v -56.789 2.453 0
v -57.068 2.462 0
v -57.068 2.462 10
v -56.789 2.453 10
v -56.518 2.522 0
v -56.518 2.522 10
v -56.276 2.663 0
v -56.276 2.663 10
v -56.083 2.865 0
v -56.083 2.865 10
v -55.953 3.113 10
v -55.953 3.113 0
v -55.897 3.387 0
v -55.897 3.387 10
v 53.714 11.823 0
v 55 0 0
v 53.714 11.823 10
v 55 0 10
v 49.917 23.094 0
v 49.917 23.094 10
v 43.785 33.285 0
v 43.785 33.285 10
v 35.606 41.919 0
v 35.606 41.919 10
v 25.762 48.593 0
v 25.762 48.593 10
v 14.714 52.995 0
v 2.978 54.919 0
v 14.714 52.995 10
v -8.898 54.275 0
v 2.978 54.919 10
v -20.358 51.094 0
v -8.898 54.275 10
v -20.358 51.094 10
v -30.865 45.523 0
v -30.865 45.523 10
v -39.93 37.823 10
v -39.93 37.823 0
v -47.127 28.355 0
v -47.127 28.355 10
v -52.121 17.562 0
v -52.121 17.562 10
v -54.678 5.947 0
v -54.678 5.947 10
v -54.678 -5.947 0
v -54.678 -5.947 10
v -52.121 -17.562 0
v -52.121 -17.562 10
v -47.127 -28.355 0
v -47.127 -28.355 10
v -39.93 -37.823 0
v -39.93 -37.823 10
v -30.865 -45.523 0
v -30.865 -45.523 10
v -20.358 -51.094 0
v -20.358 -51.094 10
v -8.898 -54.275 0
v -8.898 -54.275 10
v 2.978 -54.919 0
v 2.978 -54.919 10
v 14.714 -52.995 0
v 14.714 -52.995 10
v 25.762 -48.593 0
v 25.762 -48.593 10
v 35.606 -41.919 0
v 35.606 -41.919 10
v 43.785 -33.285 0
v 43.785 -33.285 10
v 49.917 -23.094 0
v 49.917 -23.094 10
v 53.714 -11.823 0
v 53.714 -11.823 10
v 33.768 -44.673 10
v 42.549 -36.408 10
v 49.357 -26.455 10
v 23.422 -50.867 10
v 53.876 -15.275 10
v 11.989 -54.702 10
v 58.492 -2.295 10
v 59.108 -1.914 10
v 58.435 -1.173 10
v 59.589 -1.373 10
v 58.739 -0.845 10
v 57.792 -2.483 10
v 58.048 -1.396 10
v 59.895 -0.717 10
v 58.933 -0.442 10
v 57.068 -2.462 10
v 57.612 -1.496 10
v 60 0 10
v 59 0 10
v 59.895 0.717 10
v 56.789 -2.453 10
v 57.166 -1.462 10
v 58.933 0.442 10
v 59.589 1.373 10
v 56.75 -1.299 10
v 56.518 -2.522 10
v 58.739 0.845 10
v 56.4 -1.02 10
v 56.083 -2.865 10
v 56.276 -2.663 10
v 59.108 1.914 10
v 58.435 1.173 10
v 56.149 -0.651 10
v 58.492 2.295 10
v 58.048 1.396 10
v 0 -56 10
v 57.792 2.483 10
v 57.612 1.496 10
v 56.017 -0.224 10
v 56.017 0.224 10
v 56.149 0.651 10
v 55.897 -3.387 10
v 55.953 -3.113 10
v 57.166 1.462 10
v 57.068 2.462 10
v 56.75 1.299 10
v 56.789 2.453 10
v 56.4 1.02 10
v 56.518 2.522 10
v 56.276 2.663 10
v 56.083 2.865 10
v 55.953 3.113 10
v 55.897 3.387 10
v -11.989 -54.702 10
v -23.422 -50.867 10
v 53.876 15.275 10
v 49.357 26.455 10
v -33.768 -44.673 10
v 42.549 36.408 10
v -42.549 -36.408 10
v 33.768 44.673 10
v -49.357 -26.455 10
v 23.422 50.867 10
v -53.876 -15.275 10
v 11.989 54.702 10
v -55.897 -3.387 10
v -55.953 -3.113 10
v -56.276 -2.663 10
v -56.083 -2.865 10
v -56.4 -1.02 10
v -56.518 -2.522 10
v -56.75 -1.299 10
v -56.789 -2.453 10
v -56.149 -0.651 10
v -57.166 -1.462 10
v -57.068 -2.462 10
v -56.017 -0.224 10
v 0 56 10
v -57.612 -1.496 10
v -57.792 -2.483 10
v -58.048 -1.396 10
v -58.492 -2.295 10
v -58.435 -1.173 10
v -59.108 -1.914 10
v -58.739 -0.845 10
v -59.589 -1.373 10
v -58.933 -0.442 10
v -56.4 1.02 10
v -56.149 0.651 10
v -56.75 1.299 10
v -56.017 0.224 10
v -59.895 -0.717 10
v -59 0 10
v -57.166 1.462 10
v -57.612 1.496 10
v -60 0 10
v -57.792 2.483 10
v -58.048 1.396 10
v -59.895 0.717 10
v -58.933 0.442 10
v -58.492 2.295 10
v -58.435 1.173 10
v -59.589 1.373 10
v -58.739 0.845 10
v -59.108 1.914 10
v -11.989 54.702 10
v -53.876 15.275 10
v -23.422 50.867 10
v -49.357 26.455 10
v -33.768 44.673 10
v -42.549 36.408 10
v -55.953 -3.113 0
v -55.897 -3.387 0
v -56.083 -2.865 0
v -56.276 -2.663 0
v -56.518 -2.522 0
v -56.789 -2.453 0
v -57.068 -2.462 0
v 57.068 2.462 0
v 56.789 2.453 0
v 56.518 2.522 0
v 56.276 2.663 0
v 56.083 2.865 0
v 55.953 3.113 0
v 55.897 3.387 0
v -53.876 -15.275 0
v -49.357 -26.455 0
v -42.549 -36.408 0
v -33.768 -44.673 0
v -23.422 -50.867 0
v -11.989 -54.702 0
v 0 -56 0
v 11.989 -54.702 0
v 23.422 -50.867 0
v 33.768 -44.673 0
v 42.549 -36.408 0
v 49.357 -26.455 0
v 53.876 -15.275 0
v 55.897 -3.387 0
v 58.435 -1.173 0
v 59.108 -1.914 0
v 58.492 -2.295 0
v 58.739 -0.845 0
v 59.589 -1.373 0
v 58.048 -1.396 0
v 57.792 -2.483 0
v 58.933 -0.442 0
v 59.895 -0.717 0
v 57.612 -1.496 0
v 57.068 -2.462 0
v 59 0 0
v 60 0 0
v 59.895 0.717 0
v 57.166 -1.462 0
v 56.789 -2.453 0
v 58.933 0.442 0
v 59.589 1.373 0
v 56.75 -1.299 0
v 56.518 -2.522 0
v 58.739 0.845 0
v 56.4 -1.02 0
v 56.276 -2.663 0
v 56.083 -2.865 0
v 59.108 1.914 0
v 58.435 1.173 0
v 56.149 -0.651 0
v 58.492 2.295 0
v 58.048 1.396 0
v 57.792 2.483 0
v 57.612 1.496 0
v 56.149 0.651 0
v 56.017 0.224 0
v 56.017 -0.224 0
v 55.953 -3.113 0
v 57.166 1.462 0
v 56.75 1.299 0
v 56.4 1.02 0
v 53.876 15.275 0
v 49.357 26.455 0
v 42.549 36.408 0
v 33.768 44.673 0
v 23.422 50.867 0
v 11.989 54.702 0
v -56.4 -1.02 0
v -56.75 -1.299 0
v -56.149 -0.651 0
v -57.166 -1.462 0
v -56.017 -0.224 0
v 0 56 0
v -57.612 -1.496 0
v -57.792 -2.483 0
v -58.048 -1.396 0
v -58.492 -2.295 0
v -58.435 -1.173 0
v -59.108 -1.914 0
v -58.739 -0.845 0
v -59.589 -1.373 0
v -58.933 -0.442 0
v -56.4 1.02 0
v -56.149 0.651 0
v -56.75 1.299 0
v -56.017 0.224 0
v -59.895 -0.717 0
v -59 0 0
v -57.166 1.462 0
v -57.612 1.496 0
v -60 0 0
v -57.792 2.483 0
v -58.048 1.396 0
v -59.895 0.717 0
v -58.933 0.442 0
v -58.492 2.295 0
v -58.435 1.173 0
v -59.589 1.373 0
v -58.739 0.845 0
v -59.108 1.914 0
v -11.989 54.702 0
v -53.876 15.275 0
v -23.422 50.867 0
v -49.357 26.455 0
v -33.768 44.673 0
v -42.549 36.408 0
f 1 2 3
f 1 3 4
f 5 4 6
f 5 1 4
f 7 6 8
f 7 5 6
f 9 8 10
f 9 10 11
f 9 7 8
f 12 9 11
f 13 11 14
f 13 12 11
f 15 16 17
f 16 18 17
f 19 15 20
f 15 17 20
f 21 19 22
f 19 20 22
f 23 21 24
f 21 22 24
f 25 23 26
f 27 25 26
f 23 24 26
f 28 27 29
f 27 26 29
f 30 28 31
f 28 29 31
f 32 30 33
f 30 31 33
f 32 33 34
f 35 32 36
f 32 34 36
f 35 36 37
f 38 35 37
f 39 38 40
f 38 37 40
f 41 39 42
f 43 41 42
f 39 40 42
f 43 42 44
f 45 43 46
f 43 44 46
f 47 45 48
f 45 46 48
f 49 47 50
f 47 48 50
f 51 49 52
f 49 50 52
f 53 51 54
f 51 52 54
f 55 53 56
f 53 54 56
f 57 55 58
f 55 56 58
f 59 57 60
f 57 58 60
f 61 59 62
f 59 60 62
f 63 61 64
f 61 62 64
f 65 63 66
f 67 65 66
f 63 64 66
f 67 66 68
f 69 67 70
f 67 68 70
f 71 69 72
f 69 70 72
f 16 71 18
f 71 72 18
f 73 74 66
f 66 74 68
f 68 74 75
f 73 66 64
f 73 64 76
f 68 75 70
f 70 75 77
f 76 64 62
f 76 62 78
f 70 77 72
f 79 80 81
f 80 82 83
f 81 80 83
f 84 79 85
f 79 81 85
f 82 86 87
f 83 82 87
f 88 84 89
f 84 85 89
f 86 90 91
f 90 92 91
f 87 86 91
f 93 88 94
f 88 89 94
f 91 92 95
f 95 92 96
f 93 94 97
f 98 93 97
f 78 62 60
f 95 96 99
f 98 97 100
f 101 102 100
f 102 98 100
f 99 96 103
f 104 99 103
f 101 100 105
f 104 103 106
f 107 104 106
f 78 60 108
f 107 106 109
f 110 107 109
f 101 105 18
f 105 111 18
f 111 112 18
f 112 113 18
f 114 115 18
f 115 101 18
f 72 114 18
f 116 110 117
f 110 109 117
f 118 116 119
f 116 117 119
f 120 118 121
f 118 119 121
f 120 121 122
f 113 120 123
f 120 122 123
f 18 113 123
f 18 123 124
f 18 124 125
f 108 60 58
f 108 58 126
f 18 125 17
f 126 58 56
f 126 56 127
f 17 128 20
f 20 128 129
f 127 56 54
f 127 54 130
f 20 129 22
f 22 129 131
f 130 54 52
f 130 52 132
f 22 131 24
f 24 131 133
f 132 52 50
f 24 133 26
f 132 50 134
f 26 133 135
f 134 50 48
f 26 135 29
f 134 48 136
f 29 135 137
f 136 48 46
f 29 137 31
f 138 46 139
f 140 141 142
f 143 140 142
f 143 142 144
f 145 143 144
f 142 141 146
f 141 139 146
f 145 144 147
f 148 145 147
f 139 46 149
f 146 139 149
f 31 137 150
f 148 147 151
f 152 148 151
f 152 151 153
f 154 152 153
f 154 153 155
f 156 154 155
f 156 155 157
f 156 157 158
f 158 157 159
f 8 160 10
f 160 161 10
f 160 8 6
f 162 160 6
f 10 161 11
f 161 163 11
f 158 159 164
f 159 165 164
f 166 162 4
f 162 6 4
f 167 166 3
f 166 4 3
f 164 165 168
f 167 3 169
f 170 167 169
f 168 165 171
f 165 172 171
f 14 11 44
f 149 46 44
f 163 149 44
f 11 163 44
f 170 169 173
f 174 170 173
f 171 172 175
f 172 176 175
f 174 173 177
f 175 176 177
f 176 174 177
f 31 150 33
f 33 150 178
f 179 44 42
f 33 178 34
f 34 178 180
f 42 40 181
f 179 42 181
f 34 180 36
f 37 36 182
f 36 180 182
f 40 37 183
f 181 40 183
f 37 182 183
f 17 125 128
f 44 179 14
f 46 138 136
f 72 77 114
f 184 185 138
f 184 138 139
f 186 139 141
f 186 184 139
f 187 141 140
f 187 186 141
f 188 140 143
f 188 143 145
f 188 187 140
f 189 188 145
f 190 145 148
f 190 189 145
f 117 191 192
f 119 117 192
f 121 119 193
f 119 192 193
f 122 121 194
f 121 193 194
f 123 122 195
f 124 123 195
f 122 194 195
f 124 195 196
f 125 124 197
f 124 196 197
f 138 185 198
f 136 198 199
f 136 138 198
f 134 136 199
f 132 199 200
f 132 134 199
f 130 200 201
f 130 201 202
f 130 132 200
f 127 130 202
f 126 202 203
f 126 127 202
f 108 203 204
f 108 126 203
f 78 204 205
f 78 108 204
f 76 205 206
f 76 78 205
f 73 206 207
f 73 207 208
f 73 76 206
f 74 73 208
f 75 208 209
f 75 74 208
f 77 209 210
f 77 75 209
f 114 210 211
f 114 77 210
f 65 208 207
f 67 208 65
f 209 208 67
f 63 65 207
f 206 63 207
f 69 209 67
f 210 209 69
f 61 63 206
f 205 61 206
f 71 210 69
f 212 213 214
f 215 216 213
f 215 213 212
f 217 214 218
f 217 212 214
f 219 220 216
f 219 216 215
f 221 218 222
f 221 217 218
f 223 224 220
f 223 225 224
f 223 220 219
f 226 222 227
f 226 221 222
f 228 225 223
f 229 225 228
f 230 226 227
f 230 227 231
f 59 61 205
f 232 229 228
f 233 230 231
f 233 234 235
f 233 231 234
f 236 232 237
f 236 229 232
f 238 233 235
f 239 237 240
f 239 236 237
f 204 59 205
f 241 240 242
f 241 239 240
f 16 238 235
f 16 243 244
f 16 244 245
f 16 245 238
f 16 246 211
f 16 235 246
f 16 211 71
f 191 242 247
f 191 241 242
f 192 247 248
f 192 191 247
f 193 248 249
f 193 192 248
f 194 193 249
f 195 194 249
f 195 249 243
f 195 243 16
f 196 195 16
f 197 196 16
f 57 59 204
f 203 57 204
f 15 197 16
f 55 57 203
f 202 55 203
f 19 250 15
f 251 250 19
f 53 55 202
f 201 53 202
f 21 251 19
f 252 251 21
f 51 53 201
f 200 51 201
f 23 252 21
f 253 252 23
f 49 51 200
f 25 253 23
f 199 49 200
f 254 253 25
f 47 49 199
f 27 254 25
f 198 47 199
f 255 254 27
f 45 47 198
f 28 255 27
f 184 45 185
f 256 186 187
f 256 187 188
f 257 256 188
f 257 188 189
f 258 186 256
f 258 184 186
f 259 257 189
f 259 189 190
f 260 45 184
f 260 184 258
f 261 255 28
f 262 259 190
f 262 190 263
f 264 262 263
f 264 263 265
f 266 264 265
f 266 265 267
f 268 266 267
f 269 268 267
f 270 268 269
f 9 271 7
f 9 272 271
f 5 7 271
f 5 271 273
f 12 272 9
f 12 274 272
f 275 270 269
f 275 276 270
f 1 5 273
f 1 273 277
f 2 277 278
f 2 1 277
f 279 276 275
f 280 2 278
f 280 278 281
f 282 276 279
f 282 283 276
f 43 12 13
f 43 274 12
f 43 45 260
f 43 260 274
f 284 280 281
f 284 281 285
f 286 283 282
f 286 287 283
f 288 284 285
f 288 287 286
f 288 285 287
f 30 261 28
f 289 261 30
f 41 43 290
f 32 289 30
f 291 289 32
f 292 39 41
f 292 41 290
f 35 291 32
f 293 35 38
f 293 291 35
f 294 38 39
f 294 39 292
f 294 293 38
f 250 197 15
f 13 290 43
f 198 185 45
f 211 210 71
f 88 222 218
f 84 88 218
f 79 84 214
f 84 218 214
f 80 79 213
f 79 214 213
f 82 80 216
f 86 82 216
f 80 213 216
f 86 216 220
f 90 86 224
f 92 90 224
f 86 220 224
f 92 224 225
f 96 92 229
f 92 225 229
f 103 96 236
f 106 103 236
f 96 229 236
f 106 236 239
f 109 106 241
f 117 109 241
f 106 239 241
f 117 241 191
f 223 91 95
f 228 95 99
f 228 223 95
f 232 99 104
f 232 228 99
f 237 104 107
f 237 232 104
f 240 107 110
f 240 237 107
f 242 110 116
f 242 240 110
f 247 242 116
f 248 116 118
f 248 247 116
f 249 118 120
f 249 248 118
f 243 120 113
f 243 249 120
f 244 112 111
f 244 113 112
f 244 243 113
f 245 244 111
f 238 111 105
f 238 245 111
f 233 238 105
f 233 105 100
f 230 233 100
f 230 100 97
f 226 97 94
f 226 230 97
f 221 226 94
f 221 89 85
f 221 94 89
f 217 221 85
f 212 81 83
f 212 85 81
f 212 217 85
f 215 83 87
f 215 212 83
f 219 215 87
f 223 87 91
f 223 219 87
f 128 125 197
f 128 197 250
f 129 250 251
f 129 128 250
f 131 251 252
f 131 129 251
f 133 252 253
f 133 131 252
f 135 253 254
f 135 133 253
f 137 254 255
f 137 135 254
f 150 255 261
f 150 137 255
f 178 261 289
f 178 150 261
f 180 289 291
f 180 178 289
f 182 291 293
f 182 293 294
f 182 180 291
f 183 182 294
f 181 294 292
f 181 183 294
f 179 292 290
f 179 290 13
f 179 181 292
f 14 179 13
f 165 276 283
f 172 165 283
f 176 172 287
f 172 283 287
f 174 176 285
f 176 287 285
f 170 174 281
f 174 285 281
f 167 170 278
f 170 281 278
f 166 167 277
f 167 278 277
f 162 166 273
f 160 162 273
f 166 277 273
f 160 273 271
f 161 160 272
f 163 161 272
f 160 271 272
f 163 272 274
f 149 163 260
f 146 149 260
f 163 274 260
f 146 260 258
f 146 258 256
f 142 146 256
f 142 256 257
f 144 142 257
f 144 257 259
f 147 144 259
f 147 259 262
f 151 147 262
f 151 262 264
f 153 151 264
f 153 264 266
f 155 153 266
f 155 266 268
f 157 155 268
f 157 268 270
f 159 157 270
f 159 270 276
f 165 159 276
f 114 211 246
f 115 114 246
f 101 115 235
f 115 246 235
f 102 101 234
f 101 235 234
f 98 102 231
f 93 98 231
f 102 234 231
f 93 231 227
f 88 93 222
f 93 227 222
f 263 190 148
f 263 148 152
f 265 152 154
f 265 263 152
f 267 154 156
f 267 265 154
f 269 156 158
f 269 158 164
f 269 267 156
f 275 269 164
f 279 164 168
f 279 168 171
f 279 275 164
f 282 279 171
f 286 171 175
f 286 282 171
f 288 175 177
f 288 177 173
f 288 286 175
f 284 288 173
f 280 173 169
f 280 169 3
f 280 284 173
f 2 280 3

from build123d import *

# Parameters (mm, degrees)
F0_W     = 1
F0_H     = 10
F2_R     = 1.5
F3_DEPTH = 10


# Not quite as in the source:
# - a pattern or mirror of a feature is missing from the dataset's text; its kind, count and spacing are read off the source's solid


with BuildPart() as f1:
    # F0 (on Front) → F1 (revolve)
    with BuildSketch(Plane.XZ):
        with Locations((55.5, 5)):
            Rectangle(F0_W, F0_H)
    revolve(axis=Axis((0, 0, 25.0742025673), (0, 0, 1)))

    # F2 (on Top) → F3 (join)
    with BuildSketch(Plane.XY):
        with BuildLine():
            ThreePointArc((55.8974828375, -3.3869473613), (56.2759455722, -2.6625949972), (57.0683229814, -2.4624489744))
            ThreePointArc((57.0683229814, -2.4624489744), (60, 0), (57.0683229814, 2.4624489744))
            ThreePointArc((57.0683229814, 2.4624489744), (56.2759455722, 2.6625949972), (55.8974828375, 3.3869473613))
            Line((55.8974828375, 3.3869473613), (55.3983981693, 3.3567067599))
            ThreePointArc((55.3983981693, 3.3567067599), (55.5, 0), (55.3983981693, -3.3567067599))
            Line((55.3983981693, -3.3567067599), (55.8974828375, -3.3869473613))
        make_face()
        with Locations((57.5, 0)):
            Circle(F2_R, mode=Mode.SUBTRACT)
    f3 = extrude(amount=F3_DEPTH)

    # F3_copies: F3 across plane
    add(f3.mirror(Plane(origin=(0, 0, 0), x_dir=(0, 0, -1), z_dir=(-1, 0, 0))))


solid = f1.part
